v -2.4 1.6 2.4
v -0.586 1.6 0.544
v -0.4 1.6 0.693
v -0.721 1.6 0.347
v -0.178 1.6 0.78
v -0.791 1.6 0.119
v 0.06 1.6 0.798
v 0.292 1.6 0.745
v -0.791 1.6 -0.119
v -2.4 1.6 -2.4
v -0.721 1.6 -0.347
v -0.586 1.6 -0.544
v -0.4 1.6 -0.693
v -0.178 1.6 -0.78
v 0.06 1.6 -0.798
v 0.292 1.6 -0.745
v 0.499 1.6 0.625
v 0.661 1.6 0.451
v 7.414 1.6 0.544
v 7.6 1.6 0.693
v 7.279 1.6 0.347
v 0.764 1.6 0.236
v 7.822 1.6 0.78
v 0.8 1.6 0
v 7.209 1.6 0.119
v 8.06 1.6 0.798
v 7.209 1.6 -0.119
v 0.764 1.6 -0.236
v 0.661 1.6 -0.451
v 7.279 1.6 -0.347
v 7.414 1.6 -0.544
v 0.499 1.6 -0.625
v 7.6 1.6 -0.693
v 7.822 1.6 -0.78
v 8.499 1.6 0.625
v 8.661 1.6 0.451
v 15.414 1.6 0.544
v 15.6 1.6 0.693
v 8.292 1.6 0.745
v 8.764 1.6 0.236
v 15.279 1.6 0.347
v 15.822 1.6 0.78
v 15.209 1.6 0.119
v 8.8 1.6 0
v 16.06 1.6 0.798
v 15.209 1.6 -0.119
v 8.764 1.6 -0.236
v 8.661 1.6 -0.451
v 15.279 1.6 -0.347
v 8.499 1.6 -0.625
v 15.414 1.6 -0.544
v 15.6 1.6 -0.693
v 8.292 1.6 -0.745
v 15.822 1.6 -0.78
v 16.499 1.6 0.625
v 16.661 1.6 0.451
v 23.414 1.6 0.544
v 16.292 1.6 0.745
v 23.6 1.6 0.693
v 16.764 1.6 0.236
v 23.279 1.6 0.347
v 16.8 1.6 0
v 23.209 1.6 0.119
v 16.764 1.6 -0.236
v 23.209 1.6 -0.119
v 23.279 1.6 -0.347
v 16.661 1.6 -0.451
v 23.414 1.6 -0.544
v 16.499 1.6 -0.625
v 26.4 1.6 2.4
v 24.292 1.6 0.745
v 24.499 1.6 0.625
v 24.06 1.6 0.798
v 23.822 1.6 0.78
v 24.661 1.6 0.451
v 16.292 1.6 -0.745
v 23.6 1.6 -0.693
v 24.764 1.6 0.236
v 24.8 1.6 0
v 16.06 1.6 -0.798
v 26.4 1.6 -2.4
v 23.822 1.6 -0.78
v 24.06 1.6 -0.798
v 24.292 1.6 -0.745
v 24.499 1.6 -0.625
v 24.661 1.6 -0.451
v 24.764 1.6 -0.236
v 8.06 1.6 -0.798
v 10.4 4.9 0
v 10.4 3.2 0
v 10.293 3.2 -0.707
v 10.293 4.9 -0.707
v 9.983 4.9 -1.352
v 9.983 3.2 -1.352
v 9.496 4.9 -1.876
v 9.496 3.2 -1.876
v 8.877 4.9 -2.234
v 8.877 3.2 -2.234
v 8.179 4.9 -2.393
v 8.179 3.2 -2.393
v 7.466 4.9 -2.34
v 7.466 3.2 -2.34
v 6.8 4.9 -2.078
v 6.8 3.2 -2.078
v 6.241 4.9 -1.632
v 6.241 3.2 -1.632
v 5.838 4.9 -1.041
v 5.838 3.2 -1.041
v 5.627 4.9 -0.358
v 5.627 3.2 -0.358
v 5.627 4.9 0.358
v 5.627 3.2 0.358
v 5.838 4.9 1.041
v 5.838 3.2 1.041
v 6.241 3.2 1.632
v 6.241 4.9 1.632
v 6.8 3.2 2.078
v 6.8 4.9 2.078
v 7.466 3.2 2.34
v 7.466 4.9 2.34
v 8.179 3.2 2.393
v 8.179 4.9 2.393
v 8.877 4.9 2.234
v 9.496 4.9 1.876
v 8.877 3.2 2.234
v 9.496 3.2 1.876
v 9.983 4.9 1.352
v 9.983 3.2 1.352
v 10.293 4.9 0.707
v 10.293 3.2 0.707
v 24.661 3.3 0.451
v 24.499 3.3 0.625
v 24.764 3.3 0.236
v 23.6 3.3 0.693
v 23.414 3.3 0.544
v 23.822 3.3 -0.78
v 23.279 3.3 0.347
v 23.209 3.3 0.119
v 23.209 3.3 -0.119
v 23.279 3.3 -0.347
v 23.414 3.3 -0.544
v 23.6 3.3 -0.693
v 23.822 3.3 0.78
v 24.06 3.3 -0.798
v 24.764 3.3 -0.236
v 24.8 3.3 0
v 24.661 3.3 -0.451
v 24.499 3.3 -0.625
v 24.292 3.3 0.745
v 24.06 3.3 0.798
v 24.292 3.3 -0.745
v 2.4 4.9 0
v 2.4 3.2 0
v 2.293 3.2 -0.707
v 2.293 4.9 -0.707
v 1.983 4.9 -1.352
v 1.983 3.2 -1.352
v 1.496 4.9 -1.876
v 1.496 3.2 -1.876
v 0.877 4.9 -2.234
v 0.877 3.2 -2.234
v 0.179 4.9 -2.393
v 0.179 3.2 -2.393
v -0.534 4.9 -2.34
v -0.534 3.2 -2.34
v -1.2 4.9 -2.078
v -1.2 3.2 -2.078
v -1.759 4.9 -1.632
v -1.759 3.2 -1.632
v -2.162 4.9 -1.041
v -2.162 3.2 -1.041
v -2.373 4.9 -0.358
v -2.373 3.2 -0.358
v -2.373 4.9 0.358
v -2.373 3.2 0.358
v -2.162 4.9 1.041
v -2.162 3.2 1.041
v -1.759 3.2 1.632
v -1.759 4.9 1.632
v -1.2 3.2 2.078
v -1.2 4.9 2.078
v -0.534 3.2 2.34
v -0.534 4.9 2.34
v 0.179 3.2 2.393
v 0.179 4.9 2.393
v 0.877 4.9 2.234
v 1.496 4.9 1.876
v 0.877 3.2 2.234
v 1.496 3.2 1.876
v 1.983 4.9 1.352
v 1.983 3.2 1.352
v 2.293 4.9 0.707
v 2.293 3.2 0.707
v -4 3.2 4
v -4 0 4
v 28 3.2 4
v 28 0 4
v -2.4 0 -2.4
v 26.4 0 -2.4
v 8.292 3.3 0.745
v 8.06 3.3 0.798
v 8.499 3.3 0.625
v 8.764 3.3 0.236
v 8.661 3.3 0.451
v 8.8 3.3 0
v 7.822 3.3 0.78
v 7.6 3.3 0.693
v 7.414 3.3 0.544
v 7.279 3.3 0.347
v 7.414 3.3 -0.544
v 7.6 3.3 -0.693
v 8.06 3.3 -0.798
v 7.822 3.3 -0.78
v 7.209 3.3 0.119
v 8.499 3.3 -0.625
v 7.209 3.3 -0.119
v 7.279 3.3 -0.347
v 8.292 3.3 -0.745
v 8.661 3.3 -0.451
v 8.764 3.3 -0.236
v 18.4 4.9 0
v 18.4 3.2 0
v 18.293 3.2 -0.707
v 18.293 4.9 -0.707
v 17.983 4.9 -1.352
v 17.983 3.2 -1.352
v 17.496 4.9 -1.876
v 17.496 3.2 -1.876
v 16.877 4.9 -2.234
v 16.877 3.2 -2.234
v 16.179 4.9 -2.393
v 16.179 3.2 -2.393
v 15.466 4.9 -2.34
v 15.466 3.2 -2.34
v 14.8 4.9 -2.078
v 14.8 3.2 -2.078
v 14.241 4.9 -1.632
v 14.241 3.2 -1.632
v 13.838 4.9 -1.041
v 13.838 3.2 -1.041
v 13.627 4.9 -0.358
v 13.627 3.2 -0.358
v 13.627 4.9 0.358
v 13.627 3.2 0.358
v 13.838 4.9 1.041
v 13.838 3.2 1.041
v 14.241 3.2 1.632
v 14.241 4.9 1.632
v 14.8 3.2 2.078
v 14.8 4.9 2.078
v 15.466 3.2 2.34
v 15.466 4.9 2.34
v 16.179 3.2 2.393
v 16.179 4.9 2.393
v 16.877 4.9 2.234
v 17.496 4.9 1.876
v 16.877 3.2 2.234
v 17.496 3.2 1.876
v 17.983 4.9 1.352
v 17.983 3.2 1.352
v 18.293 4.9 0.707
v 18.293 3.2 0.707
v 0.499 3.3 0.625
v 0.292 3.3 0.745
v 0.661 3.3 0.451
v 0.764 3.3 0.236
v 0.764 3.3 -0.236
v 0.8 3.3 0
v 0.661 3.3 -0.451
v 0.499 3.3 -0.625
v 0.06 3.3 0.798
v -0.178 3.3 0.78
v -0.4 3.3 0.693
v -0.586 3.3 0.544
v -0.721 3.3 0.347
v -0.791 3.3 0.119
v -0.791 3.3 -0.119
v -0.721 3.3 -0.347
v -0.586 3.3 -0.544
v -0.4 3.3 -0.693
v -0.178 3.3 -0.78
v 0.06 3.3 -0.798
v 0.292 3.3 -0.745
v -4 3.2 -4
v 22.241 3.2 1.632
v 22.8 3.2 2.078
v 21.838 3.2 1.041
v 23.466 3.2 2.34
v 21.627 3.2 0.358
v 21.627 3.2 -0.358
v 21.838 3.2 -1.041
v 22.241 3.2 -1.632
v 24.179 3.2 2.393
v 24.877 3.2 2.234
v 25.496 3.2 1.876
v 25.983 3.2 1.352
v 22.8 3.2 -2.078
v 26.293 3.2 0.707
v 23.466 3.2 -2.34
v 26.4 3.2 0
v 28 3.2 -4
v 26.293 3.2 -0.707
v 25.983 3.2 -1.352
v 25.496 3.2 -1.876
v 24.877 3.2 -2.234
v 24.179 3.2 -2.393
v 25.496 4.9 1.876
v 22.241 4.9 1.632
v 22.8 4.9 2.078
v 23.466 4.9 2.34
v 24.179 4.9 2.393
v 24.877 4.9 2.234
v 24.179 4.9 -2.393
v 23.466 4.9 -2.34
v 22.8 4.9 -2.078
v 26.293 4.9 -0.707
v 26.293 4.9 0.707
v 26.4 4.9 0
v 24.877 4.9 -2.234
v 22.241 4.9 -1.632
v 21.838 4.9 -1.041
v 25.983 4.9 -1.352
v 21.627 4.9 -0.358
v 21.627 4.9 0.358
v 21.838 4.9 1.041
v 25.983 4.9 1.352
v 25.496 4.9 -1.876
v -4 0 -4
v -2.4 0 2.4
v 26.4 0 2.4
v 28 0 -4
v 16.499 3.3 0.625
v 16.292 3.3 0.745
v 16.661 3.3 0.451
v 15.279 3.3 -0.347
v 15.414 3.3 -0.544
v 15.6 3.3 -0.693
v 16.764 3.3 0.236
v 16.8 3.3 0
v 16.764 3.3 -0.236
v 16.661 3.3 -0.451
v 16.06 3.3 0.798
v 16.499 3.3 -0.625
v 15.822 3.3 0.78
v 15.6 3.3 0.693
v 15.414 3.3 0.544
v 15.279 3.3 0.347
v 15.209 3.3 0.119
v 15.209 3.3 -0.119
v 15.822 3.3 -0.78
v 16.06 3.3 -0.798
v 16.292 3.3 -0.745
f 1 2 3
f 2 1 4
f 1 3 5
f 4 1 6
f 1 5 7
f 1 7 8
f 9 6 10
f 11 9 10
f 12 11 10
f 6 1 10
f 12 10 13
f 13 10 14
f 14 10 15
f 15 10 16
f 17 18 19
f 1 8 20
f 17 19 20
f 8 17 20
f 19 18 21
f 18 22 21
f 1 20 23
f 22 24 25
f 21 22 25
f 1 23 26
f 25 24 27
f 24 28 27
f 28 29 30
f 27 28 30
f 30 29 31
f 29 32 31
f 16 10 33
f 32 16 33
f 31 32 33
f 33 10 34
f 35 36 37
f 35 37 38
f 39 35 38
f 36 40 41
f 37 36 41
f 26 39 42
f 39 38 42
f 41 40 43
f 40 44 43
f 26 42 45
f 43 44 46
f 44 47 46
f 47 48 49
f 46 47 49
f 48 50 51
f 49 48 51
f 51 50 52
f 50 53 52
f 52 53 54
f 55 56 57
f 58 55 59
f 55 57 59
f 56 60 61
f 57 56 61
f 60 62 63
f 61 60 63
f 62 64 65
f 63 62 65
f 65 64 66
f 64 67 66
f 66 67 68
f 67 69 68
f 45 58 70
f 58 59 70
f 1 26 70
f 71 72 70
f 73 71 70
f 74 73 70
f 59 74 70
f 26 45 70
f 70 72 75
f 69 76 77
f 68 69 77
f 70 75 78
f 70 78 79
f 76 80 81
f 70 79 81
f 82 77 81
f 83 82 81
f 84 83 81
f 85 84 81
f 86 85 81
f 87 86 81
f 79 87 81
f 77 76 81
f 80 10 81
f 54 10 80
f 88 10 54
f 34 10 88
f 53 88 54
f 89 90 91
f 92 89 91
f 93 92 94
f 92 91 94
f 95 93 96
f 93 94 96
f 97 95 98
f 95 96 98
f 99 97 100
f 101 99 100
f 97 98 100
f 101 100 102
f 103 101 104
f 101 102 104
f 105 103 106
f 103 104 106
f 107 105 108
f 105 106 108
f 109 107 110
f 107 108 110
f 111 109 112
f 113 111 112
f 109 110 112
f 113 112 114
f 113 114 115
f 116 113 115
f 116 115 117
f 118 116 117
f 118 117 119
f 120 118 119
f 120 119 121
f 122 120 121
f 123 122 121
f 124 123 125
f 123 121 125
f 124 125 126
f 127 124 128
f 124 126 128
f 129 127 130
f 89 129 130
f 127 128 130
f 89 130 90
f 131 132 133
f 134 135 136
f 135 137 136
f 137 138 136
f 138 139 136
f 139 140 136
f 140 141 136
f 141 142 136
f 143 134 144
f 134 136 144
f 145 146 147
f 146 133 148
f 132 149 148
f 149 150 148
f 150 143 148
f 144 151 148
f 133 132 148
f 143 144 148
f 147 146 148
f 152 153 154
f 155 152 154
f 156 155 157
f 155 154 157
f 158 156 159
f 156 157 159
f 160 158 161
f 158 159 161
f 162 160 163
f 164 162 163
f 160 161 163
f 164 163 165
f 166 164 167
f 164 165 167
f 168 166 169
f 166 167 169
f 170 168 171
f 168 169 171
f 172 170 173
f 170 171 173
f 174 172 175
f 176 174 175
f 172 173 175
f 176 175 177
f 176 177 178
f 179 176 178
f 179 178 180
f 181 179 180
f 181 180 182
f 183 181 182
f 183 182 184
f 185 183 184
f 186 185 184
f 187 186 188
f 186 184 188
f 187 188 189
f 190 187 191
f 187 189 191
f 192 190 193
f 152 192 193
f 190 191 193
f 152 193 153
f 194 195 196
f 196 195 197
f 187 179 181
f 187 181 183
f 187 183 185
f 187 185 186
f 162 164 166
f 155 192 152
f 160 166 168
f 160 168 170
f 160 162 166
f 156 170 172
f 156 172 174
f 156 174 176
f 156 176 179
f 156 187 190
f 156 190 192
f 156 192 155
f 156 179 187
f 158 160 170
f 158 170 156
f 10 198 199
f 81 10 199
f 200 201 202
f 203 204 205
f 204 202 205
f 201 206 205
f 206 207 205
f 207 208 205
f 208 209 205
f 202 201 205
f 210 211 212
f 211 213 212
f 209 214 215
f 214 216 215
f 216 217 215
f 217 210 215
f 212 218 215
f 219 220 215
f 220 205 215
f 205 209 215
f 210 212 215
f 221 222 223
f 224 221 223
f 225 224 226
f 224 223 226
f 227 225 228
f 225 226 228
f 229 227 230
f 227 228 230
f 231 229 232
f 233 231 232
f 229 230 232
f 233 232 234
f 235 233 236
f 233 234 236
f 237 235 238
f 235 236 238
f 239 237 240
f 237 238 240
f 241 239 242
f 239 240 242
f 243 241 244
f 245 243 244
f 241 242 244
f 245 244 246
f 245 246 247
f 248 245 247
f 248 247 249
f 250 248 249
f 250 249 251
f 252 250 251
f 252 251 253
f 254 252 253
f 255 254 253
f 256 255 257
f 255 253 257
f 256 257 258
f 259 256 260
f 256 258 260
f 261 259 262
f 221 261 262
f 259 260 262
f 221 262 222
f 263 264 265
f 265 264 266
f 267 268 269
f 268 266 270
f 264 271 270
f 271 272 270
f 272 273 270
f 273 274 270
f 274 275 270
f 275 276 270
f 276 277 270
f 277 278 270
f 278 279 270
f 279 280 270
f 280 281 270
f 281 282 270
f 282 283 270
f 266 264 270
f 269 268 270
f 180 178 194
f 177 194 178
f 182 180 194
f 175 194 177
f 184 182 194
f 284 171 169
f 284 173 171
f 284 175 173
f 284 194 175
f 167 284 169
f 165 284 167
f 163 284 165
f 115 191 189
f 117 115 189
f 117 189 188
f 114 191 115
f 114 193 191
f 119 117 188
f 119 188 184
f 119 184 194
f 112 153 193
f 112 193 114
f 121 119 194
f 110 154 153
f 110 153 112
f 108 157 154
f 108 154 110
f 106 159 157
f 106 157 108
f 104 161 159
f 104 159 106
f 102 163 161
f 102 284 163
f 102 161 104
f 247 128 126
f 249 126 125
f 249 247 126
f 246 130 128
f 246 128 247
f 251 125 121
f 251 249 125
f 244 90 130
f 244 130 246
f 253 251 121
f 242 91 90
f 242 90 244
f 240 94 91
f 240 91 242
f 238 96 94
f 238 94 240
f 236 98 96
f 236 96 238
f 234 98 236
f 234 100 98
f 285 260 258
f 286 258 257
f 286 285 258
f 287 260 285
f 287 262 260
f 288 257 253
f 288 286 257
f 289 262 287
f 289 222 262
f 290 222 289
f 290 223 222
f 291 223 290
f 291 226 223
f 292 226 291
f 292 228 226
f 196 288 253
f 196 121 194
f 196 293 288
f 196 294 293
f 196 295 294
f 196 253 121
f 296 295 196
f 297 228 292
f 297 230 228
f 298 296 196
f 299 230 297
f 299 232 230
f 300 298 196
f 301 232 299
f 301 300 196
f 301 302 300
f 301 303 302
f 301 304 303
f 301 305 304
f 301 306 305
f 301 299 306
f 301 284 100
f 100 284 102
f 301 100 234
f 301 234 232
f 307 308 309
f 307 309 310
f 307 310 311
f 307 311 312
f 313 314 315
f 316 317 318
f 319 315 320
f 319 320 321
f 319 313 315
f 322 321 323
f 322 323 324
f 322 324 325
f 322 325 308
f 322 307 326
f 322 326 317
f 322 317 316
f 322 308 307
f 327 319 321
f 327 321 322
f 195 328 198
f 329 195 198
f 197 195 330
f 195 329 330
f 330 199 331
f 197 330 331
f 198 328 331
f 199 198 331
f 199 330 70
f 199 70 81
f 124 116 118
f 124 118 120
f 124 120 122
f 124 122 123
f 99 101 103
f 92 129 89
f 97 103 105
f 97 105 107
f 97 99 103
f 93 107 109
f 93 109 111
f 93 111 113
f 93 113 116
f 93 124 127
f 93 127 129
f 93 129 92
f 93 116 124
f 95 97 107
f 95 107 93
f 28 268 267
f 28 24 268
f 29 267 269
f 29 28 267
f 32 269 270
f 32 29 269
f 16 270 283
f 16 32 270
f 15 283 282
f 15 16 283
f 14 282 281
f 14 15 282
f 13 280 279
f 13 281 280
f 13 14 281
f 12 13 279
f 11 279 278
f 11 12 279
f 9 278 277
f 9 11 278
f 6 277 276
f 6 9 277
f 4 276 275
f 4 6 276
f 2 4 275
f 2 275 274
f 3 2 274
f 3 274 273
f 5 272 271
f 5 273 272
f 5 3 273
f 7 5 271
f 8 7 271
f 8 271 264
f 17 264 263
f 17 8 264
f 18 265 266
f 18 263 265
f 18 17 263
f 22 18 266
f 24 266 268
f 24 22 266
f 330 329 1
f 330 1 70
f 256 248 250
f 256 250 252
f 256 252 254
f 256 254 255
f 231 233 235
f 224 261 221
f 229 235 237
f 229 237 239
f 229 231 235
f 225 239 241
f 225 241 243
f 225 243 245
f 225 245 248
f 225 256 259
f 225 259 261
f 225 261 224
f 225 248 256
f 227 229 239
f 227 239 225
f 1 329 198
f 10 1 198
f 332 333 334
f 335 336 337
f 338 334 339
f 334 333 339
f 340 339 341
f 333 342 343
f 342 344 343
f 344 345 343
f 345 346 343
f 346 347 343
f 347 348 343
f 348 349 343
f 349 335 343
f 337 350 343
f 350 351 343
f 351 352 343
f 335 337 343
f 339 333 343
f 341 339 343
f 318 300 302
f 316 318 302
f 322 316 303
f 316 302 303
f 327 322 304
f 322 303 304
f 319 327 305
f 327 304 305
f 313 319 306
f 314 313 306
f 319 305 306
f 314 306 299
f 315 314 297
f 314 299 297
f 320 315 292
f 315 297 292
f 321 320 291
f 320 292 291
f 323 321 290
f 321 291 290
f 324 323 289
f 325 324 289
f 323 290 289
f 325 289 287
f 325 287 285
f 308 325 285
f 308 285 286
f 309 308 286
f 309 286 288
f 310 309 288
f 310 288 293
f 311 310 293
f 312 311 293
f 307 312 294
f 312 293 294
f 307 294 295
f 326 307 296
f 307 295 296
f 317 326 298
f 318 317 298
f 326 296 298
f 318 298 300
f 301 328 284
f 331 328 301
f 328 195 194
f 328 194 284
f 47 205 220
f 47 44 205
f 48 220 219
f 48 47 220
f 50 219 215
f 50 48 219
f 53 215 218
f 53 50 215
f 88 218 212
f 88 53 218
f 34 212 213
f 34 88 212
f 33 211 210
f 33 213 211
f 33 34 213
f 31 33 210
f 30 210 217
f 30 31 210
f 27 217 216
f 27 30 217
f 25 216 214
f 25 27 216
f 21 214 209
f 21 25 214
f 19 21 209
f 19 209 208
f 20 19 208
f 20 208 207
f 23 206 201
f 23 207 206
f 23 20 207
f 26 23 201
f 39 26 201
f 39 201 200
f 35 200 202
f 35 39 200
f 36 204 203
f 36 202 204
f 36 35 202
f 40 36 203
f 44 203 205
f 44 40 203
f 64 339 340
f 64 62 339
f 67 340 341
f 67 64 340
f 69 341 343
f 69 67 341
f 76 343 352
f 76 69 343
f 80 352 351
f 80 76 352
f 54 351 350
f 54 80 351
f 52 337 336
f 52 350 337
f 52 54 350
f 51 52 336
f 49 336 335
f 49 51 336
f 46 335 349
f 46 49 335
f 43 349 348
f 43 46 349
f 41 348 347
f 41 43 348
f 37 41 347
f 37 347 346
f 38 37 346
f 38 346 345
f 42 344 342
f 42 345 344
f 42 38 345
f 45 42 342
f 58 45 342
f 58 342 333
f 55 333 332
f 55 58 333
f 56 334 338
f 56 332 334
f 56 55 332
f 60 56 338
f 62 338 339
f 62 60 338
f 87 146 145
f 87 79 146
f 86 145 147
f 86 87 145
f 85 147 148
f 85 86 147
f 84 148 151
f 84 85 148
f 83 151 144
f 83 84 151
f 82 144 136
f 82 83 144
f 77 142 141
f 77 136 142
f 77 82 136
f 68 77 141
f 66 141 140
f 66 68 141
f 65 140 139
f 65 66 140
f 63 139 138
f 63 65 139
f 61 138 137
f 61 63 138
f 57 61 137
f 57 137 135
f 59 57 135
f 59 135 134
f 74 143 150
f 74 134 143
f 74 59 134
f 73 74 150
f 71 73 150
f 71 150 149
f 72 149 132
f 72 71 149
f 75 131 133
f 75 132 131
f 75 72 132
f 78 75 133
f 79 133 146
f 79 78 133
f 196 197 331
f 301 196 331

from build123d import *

# Parameters (mm, degrees)
SKETCH_1_W             = 8
SKETCH_1_H             = 8
HEIGHT_DEPTH           = 3.2
SKETCH_2_R             = 2.4
EXTRUDE_2_DEPTH        = 1.7
PATTERN_LINEAR_1_COUNT = 4
PATTERN_LINEAR_1_PITCH = 8
SHELL_1_T              = -1.6


with BuildPart() as part:
    # 草圖1 → height (new body)
    with BuildSketch(Plane(origin=(0, 0, 0), x_dir=(1, 0, 0), z_dir=(0, 1, 0))):
        Rectangle(SKETCH_1_W, SKETCH_1_H)
    height = extrude(amount=HEIGHT_DEPTH)

    # 草圖2 → 填料-伸長2 (add)
    with BuildSketch(Plane(origin=(0, 3.2, 0), x_dir=(1, 0, 0), z_dir=(0, 1, 0))):
        Circle(SKETCH_2_R)
    extrude_2 = extrude(amount=EXTRUDE_2_DEPTH)

    # 直線複製排列1: height, 填料-伸長2 ×4
    with Locations(*[(i * PATTERN_LINEAR_1_PITCH, 0, 0) for i in range(1, PATTERN_LINEAR_1_COUNT)]):
        add(height)
        add(extrude_2)

    # 薄殼1
    shell_1_openings = [part.faces().sort_by_distance(p)[0] for p in [
        (12, 0, 0),
    ]]
    offset(amount=SHELL_1_T, openings=shell_1_openings, kind=Kind.INTERSECTION)


solid = part.part
